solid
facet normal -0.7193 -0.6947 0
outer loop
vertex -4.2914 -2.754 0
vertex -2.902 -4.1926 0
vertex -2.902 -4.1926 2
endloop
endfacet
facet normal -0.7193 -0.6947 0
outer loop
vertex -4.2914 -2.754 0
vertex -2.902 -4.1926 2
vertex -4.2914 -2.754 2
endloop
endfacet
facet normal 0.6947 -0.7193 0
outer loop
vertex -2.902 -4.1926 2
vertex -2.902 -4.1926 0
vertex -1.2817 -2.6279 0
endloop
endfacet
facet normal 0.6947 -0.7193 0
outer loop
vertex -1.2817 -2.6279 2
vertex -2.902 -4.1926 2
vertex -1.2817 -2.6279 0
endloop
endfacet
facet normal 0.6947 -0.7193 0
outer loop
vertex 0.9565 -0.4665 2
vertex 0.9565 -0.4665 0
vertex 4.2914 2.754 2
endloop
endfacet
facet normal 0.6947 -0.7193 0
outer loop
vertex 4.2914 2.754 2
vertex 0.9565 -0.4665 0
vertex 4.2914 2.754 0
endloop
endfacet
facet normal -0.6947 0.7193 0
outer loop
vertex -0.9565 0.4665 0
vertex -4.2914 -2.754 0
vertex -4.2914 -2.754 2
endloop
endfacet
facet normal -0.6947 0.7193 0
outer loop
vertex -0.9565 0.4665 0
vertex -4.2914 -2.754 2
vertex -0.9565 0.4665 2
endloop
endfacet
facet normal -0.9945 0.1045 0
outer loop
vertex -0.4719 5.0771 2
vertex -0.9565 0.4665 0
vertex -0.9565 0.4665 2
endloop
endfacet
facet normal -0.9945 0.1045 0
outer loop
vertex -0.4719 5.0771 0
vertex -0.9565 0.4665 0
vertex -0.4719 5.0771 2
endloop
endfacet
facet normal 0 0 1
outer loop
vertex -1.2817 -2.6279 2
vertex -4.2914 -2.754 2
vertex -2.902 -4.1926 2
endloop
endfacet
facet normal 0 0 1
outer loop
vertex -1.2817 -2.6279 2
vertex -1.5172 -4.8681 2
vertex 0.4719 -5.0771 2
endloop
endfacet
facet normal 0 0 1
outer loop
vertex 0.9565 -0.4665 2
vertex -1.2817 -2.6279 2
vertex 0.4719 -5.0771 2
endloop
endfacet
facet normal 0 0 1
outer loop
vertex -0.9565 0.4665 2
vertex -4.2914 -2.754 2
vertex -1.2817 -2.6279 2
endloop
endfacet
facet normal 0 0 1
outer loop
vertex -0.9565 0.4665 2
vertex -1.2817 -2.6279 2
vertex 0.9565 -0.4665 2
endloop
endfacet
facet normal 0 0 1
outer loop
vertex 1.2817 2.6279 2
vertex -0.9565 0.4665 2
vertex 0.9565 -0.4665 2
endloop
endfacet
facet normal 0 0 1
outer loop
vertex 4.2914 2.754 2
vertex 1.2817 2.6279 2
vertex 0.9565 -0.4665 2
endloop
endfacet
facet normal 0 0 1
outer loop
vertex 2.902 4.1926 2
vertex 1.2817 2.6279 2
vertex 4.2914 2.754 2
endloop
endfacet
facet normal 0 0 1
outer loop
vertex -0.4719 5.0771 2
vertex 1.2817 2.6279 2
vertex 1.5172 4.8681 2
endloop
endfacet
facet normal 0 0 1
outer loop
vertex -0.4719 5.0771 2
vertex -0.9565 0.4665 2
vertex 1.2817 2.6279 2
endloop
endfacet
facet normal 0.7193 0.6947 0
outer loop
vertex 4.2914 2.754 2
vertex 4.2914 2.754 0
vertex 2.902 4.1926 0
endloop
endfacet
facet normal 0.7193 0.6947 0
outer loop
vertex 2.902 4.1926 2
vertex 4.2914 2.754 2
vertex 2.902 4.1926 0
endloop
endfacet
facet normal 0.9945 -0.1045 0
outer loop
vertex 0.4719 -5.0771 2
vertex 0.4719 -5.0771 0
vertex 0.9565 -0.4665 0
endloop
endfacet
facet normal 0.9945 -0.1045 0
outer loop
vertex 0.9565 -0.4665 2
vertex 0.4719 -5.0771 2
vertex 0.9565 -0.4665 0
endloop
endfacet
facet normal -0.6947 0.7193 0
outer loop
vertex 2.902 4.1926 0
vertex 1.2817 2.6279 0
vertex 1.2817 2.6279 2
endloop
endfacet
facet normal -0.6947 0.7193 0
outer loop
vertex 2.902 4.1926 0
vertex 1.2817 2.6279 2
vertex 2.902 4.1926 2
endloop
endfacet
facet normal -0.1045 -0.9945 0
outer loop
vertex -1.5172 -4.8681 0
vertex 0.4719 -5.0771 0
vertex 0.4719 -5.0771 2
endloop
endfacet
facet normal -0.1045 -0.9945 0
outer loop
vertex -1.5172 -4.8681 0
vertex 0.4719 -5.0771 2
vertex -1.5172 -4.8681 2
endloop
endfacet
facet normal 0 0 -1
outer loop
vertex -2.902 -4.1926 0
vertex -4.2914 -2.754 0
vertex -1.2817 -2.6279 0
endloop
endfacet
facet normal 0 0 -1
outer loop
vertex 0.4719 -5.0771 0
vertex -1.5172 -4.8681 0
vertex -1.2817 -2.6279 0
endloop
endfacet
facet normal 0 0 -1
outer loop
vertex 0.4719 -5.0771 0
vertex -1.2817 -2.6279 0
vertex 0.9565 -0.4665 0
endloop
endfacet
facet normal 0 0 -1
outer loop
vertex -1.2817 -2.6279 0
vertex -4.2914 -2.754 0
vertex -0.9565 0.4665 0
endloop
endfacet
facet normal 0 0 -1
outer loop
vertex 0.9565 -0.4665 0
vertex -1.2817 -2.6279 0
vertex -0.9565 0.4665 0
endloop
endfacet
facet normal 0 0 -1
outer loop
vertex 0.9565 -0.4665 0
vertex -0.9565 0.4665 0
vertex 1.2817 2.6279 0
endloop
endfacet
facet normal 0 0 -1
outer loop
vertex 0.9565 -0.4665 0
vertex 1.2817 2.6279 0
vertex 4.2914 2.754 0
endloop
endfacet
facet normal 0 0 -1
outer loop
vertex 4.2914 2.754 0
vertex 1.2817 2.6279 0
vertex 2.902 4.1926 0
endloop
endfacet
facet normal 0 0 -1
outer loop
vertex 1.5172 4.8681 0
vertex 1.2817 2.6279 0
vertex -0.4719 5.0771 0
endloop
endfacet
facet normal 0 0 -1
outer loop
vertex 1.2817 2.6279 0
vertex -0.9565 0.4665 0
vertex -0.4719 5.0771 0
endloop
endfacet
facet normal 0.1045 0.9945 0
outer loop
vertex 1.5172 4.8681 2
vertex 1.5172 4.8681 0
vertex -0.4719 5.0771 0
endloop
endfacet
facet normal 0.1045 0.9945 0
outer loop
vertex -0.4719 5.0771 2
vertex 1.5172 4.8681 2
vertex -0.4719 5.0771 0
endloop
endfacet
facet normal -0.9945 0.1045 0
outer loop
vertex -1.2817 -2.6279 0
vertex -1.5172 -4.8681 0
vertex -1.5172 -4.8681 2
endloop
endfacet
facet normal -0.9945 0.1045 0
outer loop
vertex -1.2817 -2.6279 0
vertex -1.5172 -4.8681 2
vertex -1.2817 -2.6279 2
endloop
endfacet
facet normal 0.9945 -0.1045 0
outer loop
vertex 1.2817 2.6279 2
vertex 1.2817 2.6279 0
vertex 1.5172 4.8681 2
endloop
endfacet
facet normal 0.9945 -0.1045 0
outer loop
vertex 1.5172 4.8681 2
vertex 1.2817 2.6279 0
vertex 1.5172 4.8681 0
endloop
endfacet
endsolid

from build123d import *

# Parameters (mm, degrees)
BOX001_W               = 10
BOX001_H               = 2
BOX001_DEPTH           = 2
BOX001_PLACEMENT_ANGLE = 20
BOX_W                  = 10
BOX_H                  = 2
BOX_DEPTH              = 2
BOX_PLACEMENT_ANGLE    = 20
FUSION_PLACEMENT_ANGLE = 64


with BuildPart() as cube001:
    # Box001 → Box001 (new body)
    with BuildSketch(Plane.XY):
        with Locations((5, 1)):
            Rectangle(BOX001_W, BOX001_H)
    extrude(amount=BOX001_DEPTH)


with BuildPart() as cube001_1:
    # Box001 placement: moved
    add(cube001.part.moved(Location((-5.040483, 0.770408, 0))).rotate(Axis((-5.040483, 0.770408, 0), (0, 0, -1)), BOX001_PLACEMENT_ANGLE))


with BuildPart() as fusion:
    # Box → Box (new body)
    with BuildSketch(Plane.XY):
        with Locations((5, 1)):
            Rectangle(BOX_W, BOX_H)
    extrude(amount=BOX_DEPTH)


with BuildPart() as fusion_1:
    # Box placement: moved
    add(fusion.part.moved(Location((-4.356443, -2.649793, 0))).rotate(Axis((-4.356443, -2.649793, 0), (0, 0, 1)), BOX_PLACEMENT_ANGLE))

    # Fusion: union Cube001
    add(cube001_1.part)


with BuildPart() as fusion_2:
    # Fusion placement: moved
    add(fusion_1.part.rotate(Axis((0, 0, 0), (0, 0, 1)), FUSION_PLACEMENT_ANGLE))


solid = fusion_2.part
